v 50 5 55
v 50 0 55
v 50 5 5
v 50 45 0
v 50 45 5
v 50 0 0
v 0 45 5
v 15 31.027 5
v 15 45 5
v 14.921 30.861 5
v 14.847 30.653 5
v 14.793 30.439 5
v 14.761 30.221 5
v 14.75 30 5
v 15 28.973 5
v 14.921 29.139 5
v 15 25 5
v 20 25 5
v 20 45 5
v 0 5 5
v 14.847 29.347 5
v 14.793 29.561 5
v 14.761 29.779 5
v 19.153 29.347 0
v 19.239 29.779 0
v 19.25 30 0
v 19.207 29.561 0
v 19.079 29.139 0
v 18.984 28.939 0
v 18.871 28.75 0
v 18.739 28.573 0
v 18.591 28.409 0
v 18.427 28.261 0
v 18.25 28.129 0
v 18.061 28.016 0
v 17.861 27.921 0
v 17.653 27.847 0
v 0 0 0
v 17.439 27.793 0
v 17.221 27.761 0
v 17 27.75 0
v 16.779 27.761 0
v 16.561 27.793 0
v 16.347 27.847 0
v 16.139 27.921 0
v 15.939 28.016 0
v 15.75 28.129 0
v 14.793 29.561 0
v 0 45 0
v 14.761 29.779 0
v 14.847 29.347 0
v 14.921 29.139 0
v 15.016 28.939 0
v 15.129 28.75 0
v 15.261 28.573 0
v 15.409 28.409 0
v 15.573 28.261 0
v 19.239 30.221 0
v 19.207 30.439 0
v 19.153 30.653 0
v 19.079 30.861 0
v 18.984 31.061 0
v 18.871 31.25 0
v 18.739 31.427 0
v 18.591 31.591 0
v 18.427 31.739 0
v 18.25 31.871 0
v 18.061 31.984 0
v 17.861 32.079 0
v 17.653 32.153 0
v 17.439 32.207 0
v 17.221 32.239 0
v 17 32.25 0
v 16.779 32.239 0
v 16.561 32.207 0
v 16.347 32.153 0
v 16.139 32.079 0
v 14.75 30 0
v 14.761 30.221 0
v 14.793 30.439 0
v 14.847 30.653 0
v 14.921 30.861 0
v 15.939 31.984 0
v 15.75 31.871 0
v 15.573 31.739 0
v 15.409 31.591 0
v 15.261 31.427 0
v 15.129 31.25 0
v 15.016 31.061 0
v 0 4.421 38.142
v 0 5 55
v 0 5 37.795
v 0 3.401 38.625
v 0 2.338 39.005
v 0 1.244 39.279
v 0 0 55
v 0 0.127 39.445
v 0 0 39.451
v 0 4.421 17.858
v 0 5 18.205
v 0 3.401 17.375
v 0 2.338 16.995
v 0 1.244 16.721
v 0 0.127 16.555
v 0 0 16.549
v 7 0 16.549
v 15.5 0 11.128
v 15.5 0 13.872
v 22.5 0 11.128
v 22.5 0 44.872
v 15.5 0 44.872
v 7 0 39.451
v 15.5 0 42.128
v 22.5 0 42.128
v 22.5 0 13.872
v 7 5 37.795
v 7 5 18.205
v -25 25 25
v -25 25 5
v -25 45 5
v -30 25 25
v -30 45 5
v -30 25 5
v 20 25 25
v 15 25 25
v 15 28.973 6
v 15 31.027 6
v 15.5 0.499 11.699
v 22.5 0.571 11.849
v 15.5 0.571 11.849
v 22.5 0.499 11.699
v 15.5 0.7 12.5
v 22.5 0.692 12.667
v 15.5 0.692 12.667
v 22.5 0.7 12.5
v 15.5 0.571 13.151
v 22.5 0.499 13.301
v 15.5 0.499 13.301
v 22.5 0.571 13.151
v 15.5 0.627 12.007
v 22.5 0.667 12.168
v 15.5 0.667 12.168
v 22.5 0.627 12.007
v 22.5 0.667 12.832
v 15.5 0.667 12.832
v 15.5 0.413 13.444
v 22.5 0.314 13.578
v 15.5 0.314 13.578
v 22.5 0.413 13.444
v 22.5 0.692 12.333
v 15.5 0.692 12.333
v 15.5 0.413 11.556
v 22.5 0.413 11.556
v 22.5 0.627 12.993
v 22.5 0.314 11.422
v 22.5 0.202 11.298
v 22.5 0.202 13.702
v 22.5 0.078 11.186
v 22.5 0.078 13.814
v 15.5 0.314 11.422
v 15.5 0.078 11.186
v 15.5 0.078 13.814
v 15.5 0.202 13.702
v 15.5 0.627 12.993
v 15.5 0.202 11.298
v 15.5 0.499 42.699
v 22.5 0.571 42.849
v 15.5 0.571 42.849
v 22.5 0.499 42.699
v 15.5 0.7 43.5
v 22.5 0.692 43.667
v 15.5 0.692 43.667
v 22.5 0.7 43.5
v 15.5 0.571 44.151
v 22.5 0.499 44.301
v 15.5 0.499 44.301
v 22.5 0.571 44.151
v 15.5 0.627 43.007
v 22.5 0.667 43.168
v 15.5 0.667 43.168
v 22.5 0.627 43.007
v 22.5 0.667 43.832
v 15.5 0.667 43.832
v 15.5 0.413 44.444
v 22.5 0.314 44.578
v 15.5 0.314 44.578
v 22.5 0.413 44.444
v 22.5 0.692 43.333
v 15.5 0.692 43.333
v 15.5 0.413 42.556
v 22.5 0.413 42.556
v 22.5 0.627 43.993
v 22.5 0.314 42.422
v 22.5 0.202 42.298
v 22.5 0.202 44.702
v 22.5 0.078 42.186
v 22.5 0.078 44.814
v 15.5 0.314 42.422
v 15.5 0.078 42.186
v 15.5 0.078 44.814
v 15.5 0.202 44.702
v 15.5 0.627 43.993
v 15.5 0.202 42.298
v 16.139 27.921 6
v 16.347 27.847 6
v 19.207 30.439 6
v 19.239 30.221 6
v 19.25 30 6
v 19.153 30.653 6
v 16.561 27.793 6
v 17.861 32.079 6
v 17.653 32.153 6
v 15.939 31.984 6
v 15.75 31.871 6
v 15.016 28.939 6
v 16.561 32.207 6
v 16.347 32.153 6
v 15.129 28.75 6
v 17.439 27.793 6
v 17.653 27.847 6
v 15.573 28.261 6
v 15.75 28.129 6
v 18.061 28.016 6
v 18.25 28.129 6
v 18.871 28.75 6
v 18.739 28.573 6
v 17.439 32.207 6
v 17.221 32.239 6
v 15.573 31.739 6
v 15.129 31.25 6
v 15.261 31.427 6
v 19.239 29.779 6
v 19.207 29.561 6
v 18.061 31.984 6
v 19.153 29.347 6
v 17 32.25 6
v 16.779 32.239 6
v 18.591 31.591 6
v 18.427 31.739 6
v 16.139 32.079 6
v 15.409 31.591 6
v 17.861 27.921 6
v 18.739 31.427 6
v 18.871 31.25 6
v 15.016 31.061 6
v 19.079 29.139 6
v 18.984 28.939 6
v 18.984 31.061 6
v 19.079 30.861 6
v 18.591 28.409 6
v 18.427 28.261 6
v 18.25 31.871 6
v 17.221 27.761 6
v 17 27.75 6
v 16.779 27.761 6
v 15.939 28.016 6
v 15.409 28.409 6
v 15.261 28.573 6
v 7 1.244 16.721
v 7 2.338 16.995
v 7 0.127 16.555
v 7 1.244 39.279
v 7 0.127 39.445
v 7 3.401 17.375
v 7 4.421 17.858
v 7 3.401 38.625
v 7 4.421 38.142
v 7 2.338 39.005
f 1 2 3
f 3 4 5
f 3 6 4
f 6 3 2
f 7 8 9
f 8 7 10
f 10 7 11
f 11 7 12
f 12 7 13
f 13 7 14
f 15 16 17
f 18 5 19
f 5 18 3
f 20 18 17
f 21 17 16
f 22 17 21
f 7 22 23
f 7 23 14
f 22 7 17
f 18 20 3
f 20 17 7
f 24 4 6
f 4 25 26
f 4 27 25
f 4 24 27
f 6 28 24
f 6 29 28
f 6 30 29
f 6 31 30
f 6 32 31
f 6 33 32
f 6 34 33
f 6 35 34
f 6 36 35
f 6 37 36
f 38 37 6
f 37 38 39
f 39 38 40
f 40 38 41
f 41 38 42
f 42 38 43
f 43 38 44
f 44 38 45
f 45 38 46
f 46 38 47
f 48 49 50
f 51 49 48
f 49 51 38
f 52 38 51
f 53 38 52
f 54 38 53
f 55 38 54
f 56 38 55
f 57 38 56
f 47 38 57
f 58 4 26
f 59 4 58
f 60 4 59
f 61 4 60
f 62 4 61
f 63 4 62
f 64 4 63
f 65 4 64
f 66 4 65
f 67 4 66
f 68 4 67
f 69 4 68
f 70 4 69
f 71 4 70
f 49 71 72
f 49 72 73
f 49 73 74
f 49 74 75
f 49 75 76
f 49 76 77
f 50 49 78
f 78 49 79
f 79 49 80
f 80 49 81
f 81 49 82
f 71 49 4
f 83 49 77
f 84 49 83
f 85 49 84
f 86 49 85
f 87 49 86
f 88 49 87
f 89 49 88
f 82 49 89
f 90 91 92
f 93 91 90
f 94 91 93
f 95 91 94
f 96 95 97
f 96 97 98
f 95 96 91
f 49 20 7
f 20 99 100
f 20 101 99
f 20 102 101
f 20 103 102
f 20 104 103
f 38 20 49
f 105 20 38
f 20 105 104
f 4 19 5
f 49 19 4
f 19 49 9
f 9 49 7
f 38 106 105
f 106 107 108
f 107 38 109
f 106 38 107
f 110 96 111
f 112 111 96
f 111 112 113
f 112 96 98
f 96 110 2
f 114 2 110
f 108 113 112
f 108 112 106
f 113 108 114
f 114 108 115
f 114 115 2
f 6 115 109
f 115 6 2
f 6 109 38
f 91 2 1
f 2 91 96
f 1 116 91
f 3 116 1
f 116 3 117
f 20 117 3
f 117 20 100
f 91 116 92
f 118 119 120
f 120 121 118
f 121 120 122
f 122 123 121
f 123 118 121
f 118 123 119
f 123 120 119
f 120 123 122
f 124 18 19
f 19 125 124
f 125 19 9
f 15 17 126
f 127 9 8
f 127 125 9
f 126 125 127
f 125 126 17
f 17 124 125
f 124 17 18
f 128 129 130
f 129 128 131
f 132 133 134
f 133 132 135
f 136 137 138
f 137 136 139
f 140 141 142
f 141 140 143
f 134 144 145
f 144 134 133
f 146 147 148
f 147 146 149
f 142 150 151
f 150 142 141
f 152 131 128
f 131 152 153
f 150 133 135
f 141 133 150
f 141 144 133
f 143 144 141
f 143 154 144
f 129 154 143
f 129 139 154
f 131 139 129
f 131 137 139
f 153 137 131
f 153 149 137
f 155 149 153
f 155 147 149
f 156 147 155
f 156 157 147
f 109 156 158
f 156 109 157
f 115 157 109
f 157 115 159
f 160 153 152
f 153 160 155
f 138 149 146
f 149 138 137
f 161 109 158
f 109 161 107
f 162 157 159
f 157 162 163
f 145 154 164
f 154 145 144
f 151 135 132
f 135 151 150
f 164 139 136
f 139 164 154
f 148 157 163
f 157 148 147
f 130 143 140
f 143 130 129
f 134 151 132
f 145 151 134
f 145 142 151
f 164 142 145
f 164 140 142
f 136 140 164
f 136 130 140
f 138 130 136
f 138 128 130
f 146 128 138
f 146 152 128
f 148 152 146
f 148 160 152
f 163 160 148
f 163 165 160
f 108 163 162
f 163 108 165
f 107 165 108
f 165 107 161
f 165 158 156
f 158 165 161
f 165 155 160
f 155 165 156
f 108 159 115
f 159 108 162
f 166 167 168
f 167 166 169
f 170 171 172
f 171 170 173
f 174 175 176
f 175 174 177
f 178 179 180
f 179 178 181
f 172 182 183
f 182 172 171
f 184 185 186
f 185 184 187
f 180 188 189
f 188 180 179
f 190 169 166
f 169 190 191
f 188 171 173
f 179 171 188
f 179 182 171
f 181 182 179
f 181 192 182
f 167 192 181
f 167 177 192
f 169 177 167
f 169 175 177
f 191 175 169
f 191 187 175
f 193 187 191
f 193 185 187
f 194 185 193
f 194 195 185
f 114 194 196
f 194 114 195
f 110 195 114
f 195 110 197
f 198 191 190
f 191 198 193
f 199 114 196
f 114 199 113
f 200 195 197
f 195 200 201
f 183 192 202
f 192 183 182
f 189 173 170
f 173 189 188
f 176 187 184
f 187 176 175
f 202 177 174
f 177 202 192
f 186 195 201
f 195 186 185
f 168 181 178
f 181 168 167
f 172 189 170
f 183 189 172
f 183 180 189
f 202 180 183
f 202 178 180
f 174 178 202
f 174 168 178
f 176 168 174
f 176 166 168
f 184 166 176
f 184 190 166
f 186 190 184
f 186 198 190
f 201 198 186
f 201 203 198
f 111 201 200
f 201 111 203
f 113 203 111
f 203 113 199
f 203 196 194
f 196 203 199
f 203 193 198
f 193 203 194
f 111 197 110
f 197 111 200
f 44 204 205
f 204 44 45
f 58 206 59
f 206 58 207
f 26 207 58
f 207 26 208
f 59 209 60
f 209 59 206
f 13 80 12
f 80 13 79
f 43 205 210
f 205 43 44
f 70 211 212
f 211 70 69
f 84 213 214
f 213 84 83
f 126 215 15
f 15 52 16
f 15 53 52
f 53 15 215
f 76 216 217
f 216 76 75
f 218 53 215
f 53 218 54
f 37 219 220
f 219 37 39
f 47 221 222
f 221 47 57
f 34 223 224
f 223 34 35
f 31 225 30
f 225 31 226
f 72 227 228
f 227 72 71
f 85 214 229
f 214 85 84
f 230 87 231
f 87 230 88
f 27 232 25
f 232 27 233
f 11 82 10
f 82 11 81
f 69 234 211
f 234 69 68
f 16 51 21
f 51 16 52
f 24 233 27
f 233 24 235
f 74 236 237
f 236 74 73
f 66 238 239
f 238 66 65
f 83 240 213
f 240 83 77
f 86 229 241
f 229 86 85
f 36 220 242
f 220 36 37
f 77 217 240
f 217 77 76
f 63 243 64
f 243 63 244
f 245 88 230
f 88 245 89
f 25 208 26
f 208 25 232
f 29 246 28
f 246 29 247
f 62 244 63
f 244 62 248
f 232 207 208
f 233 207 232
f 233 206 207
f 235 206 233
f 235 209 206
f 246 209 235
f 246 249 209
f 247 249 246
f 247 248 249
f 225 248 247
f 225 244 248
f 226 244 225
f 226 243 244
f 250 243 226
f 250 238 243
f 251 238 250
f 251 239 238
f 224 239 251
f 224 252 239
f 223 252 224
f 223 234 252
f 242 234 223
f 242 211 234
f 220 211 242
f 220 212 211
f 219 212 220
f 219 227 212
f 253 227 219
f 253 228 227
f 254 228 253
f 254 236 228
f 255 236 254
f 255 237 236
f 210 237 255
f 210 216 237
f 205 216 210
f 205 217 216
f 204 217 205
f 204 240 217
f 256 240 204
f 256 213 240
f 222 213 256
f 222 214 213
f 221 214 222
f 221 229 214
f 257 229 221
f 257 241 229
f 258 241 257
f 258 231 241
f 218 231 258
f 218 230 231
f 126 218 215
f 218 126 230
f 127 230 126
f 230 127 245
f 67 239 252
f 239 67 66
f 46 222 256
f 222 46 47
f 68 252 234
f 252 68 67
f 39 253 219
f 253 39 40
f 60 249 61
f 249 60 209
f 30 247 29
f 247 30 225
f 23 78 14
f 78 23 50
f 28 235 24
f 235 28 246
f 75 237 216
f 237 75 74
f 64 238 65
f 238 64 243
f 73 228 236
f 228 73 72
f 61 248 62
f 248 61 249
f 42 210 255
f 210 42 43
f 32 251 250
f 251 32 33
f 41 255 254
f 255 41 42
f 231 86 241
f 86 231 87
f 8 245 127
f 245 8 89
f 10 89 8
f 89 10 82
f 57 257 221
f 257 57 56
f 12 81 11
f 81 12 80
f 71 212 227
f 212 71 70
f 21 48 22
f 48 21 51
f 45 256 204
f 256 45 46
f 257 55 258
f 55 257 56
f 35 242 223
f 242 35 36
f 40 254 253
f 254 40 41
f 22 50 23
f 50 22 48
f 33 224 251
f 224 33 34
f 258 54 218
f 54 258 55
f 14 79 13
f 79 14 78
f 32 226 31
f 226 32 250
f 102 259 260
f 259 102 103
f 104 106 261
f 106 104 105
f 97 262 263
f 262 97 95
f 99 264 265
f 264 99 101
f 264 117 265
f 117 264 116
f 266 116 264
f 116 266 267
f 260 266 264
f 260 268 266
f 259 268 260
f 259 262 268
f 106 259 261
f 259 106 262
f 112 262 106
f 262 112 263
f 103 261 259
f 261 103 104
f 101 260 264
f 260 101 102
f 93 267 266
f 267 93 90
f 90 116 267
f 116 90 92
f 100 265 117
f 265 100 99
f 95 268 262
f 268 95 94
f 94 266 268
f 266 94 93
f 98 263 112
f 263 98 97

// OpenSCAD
// L-shaped NEMA 17 Stepper Motor Mounting Bracket - CORRECTED
// Designed for a syringe pump application.

// --- Dimensions ---
// Base Plate
base_x_min    = -25;
base_x_max    = 25;
base_y_min    = 0;
base_y_max    = 45;
base_z_min    = 0;
base_z_max    = 5;

// Base Plate Holes (M4)
m4_hole_d     = 4.5;
m4_hole_x1    = -17;
m4_hole_y1    = 30;
m4_hole_x2    = 17;
m4_hole_y2    = 30;

// Vertical Motor Plate
vert_x_min    = -25;
vert_x_max    = 25;
vert_y_min    = 0;
vert_y_max    = 5;
vert_z_min    = 5; 
vert_z_max    = 55; 

// Motor Boss Hole (Centering)
boss_d        = 23;
boss_x        = 0;
boss_z        = 28;
boss_y_len    = 5; // Thickness of the vertical plate

// M3 Screw Holes (Pattern)
m3_hole_d     = 3.4;
m3_pattern_s  = 31; 

// Gussets
gusset_thick   = 5;
gusset_leg_y   = 20;
gusset_leg_z   = 20;

$fn = 64;

// --- Helper Modules ---

module gusset_shape() {
    // Right triangle in YZ plane
    // Legs: 20mm along Y, 20mm along Z
    polygon(points=[[0, 0], [gusset_leg_y, 0], [0, gusset_leg_z]]);
}

// --- Main Assembly ---

difference() {
    union() {
        // Base Plate
        // Centered on X, starts at Y=0, Z=0
        translate([0, base_y_min, base_z_min])
            cube([base_x_max - base_x_min, base_y_max - base_y_min, base_z_max]);

        // Vertical Motor Plate
        // Centered on X, starts at Y=0, Z=5
        translate([0, vert_y_min, vert_z_min])
            cube([vert_x_max - vert_x_min, vert_y_max - vert_y_min, vert_z_max - vert_z_min]);

        // Gusset Left (Flush with X = -25)
        translate([base_x_min, base_y_max - gusset_leg_y, base_z_max])
            rotate([0, -90, 0])
            linear_extrude(height = gusset_thick)
            gusset_shape();

        // Gusset Right (Flush with X = 25)
        translate([base_x_max - gusset_thick, base_y_max - gusset_leg_y, base_z_max])
            rotate([0, -90, 0])
            linear_extrude(height = gusset_thick)
            gusset_shape();
    }

    // --- Negative Geometry (Cuts) ---

    // M4 Holes in Base Plate
    translate([m4_hole_x1, m4_hole_y1, -1]) 
        cylinder(h = base_z_max + 2, d = m4_hole_d);
    translate([m4_hole_x2, m4_hole_y2, -1]) 
        cylinder(h = base_z_max + 2, d = m4_hole_d);

    // Motor Boss Hole (through the vertical plate along Y)
    // The plate is 5mm thick in Y.
    translate([boss_x, -1, boss_z])
        rotate([0, 90, 0])
        cylinder(h = vert_y_max + 2, d = boss_d);

    // M3 Screw Holes (4 holes in a 31mm square pattern)
    // Centered on the boss hole (0, 28)
    // Pattern is in X and Z plane.
    for (sx = [-1, 1], sz = [-1, 1]) {
        translate([sx * (m3_pattern_s / 2), -1, boss_z + sz * (m3_pattern_s / 2)])
            rotate([0, 90, 0])
            cylinder(h = vert_y_max + 2, d = m3_hole_d);
    }
}
